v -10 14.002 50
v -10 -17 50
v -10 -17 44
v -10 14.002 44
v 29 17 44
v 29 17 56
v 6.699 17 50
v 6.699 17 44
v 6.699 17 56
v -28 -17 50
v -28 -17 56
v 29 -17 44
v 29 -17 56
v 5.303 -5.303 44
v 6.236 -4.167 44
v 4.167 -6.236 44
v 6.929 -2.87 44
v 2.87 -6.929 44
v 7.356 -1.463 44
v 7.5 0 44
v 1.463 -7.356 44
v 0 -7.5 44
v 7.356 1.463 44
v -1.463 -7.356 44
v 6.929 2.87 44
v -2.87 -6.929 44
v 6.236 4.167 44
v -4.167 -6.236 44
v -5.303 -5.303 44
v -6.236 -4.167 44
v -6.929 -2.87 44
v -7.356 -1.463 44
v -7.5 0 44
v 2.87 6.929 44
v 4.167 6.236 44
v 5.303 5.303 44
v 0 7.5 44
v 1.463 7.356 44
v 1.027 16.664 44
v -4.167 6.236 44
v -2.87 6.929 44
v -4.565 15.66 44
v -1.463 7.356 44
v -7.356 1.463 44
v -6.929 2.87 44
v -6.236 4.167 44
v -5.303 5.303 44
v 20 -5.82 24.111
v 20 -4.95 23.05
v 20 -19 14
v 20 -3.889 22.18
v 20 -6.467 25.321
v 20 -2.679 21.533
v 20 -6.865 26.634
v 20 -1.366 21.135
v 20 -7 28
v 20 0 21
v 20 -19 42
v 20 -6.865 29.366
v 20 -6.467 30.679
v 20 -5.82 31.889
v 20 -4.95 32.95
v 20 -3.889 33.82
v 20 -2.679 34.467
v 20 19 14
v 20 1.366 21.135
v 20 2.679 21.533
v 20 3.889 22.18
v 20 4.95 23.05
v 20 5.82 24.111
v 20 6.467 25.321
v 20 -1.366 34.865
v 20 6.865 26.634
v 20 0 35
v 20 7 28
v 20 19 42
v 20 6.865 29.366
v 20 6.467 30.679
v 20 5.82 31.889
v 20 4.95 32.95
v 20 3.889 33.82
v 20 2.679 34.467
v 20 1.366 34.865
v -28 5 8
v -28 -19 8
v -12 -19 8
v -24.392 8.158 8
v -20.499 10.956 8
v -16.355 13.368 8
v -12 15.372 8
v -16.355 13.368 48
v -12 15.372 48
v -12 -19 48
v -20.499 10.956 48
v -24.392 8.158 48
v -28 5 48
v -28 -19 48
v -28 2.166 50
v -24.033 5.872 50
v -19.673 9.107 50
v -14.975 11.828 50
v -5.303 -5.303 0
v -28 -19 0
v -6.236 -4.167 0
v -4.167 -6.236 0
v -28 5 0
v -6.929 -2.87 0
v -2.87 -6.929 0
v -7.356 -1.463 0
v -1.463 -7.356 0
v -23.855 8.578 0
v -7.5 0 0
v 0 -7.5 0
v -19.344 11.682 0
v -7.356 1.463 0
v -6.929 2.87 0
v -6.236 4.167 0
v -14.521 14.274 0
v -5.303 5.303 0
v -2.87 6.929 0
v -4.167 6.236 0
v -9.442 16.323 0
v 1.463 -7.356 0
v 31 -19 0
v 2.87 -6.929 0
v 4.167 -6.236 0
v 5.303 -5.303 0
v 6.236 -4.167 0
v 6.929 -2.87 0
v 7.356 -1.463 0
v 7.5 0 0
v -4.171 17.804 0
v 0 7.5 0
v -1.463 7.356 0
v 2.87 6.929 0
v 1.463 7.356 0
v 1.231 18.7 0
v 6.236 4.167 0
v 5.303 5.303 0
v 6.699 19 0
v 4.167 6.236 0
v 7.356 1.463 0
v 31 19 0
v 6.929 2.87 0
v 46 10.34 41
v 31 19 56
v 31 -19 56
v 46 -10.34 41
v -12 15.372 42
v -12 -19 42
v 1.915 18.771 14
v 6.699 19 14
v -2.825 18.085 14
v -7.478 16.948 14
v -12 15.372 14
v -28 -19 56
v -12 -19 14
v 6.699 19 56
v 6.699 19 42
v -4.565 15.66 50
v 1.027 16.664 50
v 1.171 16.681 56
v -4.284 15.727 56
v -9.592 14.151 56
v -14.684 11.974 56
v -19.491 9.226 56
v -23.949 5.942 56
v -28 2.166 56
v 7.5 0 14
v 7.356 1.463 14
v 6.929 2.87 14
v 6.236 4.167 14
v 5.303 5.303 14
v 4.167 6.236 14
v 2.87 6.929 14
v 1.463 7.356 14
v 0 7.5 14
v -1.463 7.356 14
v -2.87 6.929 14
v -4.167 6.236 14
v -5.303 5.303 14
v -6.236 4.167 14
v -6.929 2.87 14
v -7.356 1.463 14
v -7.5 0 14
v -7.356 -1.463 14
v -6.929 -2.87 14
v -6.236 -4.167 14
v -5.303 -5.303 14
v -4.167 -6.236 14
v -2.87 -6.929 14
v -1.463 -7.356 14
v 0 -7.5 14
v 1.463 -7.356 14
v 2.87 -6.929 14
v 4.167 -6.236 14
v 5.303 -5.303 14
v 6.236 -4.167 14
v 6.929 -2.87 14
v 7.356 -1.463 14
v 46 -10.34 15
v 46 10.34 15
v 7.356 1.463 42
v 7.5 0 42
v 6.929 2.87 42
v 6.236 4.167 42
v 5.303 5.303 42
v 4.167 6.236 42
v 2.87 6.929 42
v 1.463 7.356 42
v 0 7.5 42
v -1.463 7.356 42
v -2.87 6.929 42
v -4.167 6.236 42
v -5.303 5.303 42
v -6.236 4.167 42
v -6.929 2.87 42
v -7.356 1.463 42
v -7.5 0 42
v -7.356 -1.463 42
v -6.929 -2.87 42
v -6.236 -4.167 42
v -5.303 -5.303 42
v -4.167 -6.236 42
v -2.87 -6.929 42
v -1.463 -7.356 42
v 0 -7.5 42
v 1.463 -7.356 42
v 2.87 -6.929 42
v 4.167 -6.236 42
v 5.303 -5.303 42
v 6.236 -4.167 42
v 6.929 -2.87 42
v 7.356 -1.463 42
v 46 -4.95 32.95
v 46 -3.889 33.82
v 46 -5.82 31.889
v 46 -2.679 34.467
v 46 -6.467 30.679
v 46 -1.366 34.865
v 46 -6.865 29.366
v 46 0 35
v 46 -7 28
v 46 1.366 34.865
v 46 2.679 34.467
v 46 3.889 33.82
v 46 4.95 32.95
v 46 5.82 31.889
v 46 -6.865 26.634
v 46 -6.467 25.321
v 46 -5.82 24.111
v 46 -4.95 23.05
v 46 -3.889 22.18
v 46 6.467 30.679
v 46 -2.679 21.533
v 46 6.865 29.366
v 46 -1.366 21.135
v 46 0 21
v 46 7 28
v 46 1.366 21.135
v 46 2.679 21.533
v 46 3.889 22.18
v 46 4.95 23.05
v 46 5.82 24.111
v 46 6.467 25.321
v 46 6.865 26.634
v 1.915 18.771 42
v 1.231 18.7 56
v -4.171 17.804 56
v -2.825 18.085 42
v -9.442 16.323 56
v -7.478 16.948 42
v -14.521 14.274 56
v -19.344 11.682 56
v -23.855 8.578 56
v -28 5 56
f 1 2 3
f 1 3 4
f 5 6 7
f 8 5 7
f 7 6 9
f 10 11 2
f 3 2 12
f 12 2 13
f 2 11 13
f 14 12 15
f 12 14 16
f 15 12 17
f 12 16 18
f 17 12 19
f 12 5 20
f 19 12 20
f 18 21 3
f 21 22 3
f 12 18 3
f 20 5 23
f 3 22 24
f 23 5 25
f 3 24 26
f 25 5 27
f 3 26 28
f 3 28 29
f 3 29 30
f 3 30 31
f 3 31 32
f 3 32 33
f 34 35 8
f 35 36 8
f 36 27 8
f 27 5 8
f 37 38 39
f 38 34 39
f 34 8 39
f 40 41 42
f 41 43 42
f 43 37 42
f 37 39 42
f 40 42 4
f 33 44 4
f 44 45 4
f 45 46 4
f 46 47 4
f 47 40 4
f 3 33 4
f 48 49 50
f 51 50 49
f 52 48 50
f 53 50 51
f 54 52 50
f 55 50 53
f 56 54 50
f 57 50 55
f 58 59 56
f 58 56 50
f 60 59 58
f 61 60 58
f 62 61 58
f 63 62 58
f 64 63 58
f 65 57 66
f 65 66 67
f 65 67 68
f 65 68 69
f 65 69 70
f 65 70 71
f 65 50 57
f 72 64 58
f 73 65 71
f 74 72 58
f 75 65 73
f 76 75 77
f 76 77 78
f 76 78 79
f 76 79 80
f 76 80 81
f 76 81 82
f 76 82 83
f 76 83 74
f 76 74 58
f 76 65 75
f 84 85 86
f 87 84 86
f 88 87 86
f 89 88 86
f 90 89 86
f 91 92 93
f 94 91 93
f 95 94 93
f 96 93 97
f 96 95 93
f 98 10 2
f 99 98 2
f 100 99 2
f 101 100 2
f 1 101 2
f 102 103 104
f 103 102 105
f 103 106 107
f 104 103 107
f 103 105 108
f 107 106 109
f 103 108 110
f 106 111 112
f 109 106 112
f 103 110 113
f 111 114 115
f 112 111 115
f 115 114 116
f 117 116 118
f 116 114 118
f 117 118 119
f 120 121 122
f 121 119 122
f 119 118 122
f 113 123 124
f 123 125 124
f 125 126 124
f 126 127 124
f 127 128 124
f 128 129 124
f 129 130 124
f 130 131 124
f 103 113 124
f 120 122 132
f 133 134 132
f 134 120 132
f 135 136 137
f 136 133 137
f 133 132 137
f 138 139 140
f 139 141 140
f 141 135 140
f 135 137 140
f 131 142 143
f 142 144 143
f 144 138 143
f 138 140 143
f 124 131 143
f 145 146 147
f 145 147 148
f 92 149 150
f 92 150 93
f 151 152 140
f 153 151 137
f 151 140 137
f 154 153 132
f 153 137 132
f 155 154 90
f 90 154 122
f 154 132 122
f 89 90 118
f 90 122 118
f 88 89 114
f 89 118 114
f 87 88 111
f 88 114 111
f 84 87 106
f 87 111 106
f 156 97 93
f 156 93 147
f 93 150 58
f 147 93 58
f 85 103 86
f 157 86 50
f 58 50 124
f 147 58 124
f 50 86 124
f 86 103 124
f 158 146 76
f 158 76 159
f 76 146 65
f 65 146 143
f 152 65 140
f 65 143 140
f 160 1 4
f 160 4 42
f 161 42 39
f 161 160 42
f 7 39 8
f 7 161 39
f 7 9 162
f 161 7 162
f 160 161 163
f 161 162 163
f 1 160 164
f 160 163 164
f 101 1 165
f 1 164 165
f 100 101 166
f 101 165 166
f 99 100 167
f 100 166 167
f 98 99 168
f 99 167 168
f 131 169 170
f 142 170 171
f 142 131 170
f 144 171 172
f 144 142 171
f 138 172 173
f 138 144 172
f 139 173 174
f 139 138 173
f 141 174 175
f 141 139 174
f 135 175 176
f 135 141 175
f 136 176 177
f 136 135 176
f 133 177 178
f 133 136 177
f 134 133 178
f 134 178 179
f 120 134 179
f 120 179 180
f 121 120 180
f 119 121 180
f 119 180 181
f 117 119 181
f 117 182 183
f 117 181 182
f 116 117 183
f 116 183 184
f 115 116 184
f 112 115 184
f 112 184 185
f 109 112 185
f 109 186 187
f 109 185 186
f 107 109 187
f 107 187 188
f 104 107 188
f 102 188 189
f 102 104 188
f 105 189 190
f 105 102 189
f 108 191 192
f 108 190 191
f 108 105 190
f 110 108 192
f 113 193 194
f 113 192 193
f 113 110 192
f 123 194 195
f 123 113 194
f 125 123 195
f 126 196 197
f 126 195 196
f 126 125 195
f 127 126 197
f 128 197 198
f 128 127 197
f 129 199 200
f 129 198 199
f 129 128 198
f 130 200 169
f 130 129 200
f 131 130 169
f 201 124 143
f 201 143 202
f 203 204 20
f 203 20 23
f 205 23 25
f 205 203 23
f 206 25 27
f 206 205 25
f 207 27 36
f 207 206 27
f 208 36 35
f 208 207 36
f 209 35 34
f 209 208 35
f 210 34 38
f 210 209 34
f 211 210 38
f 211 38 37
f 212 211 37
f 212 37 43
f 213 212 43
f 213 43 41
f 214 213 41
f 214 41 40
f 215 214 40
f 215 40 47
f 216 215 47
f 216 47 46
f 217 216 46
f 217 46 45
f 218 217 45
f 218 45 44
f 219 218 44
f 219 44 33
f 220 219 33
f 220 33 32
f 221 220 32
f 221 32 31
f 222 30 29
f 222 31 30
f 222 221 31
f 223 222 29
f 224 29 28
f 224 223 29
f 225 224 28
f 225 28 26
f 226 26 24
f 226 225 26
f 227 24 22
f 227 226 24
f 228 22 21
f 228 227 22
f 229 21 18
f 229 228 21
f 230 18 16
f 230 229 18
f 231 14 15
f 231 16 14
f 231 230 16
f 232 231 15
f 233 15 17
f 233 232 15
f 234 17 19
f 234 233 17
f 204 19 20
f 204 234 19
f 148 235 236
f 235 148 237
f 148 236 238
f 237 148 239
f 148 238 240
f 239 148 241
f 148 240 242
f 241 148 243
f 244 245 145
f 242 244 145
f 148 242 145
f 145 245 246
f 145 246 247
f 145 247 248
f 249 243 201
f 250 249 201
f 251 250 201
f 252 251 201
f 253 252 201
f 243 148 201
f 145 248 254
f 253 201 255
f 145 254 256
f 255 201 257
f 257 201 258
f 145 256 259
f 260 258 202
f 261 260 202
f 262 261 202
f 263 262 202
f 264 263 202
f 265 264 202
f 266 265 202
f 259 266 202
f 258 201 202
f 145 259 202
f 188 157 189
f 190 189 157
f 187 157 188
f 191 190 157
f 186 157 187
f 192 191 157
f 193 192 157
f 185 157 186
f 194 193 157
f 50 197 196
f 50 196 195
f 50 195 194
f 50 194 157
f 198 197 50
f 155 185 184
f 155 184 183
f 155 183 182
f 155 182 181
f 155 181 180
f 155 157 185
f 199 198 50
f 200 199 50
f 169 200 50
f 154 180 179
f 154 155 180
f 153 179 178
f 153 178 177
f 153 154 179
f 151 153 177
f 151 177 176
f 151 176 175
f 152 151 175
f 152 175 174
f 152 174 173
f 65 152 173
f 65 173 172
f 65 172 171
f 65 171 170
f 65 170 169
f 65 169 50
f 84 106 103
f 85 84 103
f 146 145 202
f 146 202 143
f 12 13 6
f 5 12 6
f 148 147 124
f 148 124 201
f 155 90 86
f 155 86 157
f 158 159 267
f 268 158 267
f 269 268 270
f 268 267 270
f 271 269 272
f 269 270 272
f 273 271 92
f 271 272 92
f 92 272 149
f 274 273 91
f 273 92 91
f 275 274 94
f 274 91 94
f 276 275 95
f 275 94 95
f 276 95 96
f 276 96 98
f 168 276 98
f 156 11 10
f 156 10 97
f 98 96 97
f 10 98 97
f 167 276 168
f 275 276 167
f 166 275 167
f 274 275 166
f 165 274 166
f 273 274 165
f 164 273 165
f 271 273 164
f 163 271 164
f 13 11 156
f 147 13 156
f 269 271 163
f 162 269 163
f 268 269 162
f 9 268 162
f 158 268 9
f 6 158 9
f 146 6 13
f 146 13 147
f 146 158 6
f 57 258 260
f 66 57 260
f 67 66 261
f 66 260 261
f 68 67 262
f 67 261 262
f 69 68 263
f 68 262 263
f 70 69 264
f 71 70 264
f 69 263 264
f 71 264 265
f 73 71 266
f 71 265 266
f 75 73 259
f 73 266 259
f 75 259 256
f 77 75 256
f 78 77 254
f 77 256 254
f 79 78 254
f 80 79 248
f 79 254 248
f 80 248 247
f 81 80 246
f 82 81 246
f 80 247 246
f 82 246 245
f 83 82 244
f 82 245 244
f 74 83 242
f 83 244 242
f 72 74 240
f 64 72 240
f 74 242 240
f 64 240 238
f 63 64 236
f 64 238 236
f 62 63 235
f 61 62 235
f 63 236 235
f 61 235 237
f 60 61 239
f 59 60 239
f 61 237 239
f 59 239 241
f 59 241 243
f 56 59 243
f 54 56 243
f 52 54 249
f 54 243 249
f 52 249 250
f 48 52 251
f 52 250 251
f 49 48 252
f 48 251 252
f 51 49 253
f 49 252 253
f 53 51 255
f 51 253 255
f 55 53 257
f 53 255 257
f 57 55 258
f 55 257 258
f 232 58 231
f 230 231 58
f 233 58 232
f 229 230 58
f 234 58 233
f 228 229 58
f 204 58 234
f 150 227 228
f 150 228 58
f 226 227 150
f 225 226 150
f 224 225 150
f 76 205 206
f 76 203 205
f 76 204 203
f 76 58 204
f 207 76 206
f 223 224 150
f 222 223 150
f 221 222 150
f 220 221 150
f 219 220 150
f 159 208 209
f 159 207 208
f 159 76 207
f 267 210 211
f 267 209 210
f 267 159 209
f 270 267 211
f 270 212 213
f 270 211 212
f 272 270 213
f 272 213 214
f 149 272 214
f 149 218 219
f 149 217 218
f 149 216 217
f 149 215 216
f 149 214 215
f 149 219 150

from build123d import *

# Parameters (mm, degrees)
SKETCH1_R           = 7.5
BOSS_EXTRUDE1_DEPTH = 56
CUT_EXTRUDE1_DEPTH  = 38
SKETCH3_R           = 7
CUT_EXTRUDE2_DEPTH  = 26
CUT_EXTRUDE3_DEPTH  = 6
CUT_EXTRUDE4_DEPTH  = 6


with BuildPart() as part:
    # Sketch1 → Boss-Extrude1 (new body)
    with BuildSketch(Plane.XY):
        with BuildLine():
            Line((-28, -19), (31, -19))
            Line((31, -19), (46, -10.339745962))
            Line((46, -10.339745962), (46, 10.339745962))
            Line((46, 10.339745962), (31, 19))
            Line((31, 19), (6.698703146, 19))
            ThreePointArc((6.698703146, 19), (-12.009583788, 15.368092477), (-28, 5))
            Line((-28, 5), (-28, -19))
        make_face()
        Circle(SKETCH1_R, mode=Mode.SUBTRACT)
    extrude(amount=BOSS_EXTRUDE1_DEPTH)

    # Sketch2 → Cut-Extrude1 (cut)
    with BuildSketch(Plane(origin=(0, 19, 0), x_dir=(1, 0, 0), z_dir=(0, 1, 0))):
        Polygon((31, 0), (46, -15), (46, 0), align=None)
        Polygon((31, -56), (46, -41), (46, -56), align=None)
        Polygon((-28, -8), (-12, -8), (-12, -14), (20, -14), (20, -42), (-12, -42), (-12, -48), (-28, -48), align=None)
    extrude(amount=-CUT_EXTRUDE1_DEPTH, mode=Mode.SUBTRACT)

    # Sketch3 → Cut-Extrude2 (cut)
    with BuildSketch(Plane(origin=(46, 0, 0), x_dir=(0, 0, -1), z_dir=(1, 0, 0))):
        with Locations((-28, 0)):
            Circle(SKETCH3_R)
    extrude(amount=-CUT_EXTRUDE2_DEPTH, mode=Mode.SUBTRACT)

    # Sketch7 → Cut-Extrude3 (cut)
    with BuildSketch(Plane.XY.offset(56)):
        with BuildLine():
            Line((-28, 2.166247904), (-28, -17))
            Line((-28, -17), (29, -17))
            Line((29, -17), (29, 17))
            Line((29, 17), (6.698703146, 17))
            ThreePointArc((6.698703146, 17), (-12.169525449, 13.136039125), (-28, 2.166247904))
        make_face()
    extrude(amount=-CUT_EXTRUDE3_DEPTH, mode=Mode.SUBTRACT)

    # Sketch10 → Cut-Extrude4 (cut)
    with BuildSketch(Plane.XY.offset(50)):
        with BuildLine():
            Line((-10, -17), (-10, 14.001703448))
            ThreePointArc((-10, 14.001703448), (-1.784168847, 16.244479918), (6.698703146, 17))
            Line((6.698703146, 17), (29, 17))
            Line((29, 17), (29, -17))
            Line((29, -17), (-10, -17))
        make_face()
    extrude(amount=-CUT_EXTRUDE4_DEPTH, mode=Mode.SUBTRACT)


solid = part.part
